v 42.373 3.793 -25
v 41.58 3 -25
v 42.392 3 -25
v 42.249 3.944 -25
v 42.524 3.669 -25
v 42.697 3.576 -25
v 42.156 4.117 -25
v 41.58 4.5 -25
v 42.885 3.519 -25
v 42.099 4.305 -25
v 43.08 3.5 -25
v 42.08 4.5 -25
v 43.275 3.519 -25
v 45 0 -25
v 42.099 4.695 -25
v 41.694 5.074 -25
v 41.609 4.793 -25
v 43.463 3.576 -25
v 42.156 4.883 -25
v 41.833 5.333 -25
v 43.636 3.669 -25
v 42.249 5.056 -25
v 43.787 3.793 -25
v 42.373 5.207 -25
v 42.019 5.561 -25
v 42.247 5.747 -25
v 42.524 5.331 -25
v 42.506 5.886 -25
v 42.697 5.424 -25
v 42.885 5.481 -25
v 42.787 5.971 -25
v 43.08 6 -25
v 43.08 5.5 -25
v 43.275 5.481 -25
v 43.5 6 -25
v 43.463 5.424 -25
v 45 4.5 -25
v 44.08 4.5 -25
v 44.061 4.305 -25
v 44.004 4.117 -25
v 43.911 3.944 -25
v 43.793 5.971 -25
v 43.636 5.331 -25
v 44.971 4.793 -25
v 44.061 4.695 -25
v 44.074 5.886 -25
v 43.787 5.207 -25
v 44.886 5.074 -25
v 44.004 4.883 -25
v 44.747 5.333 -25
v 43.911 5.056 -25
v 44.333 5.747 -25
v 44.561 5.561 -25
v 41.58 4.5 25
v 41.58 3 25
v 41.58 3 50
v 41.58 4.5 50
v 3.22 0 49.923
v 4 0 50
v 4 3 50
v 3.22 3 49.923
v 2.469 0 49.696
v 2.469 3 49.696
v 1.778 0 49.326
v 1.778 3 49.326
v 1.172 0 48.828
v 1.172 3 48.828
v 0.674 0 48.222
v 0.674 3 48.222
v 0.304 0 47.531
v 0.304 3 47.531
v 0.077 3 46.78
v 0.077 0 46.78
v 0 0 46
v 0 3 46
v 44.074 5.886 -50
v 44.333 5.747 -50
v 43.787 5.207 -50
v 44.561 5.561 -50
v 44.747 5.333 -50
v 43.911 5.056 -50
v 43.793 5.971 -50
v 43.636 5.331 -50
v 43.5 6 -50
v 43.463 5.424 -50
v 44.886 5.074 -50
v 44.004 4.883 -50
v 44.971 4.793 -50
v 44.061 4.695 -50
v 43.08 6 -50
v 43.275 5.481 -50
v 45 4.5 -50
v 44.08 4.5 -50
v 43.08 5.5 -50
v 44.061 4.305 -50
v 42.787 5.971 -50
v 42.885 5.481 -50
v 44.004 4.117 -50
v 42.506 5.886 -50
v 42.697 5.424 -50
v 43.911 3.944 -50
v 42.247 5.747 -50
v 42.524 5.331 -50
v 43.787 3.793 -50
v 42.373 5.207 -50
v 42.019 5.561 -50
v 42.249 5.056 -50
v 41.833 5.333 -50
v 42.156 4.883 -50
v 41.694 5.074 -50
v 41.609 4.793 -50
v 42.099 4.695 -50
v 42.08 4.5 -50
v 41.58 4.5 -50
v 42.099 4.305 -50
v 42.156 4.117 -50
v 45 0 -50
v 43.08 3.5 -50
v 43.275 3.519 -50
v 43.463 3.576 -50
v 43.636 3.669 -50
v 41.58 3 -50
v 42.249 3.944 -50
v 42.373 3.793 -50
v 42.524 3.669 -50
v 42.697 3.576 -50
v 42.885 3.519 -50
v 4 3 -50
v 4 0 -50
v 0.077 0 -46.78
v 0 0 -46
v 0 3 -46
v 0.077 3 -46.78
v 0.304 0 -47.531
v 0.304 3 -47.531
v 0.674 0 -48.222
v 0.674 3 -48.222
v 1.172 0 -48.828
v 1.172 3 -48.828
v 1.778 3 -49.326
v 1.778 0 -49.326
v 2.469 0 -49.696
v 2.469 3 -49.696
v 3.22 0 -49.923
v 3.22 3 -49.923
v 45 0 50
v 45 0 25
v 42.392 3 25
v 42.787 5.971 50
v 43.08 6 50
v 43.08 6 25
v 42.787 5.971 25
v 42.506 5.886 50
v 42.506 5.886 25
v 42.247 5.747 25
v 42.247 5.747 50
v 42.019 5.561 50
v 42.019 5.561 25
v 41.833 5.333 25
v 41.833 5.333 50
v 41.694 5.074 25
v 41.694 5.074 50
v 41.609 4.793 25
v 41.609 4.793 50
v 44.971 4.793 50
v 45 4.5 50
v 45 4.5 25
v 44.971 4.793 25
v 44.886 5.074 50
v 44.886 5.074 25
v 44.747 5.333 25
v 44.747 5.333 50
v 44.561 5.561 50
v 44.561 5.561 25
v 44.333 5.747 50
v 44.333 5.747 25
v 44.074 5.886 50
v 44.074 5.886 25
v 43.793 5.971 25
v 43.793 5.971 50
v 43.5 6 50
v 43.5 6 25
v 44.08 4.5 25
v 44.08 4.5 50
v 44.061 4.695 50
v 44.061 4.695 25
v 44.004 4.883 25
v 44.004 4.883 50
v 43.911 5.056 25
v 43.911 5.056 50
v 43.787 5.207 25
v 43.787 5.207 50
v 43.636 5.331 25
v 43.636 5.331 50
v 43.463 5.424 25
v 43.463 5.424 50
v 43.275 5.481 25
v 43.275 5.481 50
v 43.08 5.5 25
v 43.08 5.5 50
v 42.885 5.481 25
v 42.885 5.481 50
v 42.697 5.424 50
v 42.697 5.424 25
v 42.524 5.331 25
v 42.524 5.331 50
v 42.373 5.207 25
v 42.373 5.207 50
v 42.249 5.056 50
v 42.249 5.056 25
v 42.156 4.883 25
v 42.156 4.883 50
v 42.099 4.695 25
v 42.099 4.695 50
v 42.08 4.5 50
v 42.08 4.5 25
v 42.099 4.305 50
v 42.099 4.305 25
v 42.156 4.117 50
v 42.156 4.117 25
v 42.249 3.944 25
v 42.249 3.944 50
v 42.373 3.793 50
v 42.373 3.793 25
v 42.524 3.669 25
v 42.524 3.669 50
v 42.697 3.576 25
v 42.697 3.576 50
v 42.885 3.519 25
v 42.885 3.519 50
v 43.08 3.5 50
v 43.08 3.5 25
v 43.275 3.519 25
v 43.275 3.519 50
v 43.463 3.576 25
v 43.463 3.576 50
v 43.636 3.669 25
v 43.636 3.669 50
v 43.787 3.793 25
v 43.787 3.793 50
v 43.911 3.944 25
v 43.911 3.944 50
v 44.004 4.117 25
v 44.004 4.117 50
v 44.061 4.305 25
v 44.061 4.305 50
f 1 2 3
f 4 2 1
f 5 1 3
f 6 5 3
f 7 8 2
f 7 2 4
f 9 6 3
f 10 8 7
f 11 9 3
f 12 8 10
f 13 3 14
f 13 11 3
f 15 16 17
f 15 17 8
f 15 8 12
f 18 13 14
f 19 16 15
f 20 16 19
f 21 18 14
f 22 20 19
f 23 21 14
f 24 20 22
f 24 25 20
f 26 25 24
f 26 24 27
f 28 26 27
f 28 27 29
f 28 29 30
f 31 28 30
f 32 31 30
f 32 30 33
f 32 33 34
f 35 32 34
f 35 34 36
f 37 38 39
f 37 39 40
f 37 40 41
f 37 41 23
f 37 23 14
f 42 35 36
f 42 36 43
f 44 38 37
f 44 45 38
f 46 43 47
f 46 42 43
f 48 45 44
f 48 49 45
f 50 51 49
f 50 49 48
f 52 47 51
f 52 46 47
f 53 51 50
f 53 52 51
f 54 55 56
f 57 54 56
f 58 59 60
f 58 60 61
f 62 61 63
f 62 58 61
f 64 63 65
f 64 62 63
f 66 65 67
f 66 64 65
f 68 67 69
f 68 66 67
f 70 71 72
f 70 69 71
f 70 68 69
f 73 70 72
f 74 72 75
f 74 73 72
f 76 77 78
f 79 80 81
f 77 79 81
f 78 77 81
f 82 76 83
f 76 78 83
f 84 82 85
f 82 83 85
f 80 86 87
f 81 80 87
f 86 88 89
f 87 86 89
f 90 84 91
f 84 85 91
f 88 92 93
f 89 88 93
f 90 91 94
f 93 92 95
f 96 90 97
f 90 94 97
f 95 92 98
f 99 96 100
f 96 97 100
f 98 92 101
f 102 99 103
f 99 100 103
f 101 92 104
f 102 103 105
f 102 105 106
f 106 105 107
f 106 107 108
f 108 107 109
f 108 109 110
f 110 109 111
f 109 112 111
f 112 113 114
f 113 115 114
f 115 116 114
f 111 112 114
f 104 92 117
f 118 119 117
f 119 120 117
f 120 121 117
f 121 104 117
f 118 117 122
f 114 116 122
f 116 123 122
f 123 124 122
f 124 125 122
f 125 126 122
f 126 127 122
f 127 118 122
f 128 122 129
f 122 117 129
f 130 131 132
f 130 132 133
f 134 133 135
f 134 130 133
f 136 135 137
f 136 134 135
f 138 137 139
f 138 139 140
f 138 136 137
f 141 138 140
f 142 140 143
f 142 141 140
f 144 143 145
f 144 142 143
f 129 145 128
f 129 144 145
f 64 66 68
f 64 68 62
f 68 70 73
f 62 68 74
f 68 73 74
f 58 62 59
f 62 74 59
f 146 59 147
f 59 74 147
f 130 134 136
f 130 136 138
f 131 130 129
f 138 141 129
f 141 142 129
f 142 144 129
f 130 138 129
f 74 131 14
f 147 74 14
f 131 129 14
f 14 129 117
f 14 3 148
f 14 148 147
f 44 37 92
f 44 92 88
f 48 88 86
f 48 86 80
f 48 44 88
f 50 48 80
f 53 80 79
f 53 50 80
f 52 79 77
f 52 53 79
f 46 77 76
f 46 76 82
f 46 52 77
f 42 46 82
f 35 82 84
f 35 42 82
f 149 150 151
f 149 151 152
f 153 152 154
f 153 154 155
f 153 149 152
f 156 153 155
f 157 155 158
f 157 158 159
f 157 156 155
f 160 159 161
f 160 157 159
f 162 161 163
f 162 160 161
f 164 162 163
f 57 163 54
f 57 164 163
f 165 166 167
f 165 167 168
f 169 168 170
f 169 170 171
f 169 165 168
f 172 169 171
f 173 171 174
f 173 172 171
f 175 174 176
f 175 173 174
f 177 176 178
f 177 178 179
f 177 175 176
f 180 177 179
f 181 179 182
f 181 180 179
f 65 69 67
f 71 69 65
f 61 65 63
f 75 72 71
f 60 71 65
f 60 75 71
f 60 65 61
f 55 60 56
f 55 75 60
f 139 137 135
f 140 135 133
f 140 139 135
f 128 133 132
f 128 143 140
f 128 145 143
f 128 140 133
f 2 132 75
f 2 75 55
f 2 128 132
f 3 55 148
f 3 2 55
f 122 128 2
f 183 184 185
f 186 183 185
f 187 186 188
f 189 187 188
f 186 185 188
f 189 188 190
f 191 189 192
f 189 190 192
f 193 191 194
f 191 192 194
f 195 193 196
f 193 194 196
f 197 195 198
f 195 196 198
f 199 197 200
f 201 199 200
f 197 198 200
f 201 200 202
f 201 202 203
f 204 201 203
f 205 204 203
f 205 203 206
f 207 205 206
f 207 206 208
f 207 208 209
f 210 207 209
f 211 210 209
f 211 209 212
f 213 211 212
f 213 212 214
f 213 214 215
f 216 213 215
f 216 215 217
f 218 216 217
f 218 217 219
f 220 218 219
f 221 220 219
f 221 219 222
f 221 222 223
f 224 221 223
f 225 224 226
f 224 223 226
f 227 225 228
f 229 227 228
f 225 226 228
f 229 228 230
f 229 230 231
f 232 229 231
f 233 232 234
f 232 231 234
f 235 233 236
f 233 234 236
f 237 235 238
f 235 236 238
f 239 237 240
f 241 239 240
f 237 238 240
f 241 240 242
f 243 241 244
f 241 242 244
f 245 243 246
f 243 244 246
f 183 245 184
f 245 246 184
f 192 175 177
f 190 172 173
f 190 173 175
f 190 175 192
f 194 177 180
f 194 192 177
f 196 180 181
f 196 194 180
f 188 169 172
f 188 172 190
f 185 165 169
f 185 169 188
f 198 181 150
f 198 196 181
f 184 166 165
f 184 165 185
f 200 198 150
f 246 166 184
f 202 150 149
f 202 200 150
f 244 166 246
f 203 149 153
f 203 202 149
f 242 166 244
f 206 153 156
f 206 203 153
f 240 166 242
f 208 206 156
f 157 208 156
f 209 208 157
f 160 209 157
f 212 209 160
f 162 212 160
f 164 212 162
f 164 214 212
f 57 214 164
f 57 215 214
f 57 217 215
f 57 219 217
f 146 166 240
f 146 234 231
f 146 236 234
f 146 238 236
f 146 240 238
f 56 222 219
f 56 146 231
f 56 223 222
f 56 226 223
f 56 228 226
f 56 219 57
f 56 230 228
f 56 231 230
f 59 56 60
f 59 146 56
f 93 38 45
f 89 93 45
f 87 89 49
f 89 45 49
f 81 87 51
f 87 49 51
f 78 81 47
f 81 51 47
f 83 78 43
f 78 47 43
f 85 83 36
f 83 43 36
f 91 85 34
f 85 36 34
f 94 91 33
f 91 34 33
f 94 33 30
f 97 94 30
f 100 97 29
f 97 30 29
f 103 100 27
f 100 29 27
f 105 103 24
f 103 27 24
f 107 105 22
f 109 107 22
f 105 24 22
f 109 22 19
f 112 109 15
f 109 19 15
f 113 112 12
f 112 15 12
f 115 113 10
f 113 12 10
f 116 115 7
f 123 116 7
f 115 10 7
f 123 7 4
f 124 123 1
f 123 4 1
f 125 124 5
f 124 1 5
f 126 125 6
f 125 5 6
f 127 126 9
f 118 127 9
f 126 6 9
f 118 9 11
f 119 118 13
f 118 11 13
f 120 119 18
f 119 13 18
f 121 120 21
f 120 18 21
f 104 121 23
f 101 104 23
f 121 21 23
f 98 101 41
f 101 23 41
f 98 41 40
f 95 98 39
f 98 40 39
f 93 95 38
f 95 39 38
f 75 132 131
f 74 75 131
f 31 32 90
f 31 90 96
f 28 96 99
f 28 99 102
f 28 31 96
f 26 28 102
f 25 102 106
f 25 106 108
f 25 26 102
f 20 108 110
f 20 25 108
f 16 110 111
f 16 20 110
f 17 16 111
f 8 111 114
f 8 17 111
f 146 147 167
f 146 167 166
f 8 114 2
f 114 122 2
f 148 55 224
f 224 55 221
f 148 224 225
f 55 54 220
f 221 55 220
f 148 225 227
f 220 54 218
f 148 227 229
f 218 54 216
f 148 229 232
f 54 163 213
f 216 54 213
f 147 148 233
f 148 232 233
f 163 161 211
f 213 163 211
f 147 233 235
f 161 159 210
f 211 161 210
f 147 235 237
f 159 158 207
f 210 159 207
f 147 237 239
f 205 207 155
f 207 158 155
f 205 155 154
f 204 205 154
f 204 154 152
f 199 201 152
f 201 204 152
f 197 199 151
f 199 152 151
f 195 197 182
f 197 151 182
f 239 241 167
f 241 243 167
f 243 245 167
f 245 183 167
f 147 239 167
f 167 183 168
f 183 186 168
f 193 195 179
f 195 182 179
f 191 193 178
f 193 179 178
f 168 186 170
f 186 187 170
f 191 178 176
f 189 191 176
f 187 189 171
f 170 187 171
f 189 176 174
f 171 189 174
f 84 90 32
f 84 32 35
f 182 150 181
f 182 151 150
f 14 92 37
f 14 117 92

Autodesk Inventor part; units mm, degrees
ref_plane "YZ Plane" through (0, 0, 0) normal (1, 0, 0) x (0, 1, 0)
ref_plane "XZ Plane" through (0, 0, 0) normal (0, 1, 0) x (-1, 0, 0)
ref_plane "XY Plane" through (0, 0, 0) normal (0, 0, 1) x (1, 0, 0)
sketch "Эскиз2" plane through (0, 0, 0) normal (0, 0, 1) x (1, 0, 0)
  line L0 (0, 0) -> (45, 0)
  line L1 (45, 0) -> (45, 3)
  line L2 (45, 3) -> (0, 3)
  line L3 (0, 3) -> (0, 0)
  dimension "d14" = 45
  dimension "d15" = 3
extrude "Выдавливание2" add sketch "Эскиз2" along normal mid plane 100
fillet "Сопряжение1" radius 4 2 edges at (0, 1.5, 50) (0, 1.5, -50)
sketch "Эскиз5" plane through (45, 3, 50) normal (0, 1, 0) x (1, 0, 0)
  line L0 (0, 100) -> (0, 0) projected
  line L1 (0, 0) -> (-41, 0) projected
  line L2 (0, 100) -> (-3.42, 100)
  line L3 (-3.42, 100) -> (-3.42, 0)
  line L4 (-3.42, 0) -> (0, 0)
  line L5 (0, 0) -> (0, 100)
  point P0 (-45, 50)
  dimension "d25" = 3.42
extrude "Выдавливание4" add sketch "Эскиз5" along normal blind 3
sketch "Эскиз6" plane through (0, 0, 50) normal (0, 0, 1) x (1, 0, 0)
  circle A0 centre (43.08, 4.5) radius 1
  line L0 (41.58, 6) -> (45, 6) projected
  line L1 (41.58, 3) -> (41.58, 6) projected
  point P0 (0, 0)
  dimension "d28" = 2
  dimension "d29" = 1.5
  dimension "d30" = 1.5
extrude "Выдавливание5" cut sketch "Эскиз6" against normal through all
sketch "Эскиз7" plane through (45, 6, 50) normal (0, 1, 0) x (1, 0, 0)
  line L0 (-3.42, 100) -> (-3.42, 0) projected
  line L1 (0, 0) -> (0, 100) projected
  line L2 (-3.42, 25) -> (0, 25)
  line L3 (0, 25) -> (0, 75)
  line L4 (0, 75) -> (-3.42, 75)
  line L5 (-3.42, 75) -> (-3.42, 25)
  line L6 (-3.42, 0) -> (-41, 0) projected
  point P0 (-45, 50)
  point P1 (-3.42, 75)
  point P2 (0, 25)
  dimension "d33" = 50
  dimension "d34" = 25
extrude "Выдавливание6" cut sketch "Эскиз7" against normal blind 3
fillet "Сопряжение2" radius 1.5 4 edges at (45, 6, 37.5) (41.58, 6, 37.5) (45, 6, -37.5) (41.58, 6, -37.5)
sketch "Эскиз8" plane through (41.58, 3, -25) normal (0, 0, 1) x (1, 0, 0)
  line L0 (3.42, -3) -> (3.42, 1.5) projected
  line L1 (0, 0.9343) -> (3.42, -3)
  line L2 (3.42, -3) -> (-37.58, -3) projected
  line L3 (0, 0) -> (0, 1.5) projected
  line L4 (0, 0.9343) -> (3.42, 0.9343)
  point P0 (-41.58, -3)
  dimension "d38" = 49
extrude "Выдавливание7" cut sketch "Эскиз8" along normal up to surface (50 mm away)
properties part number "Cover"
